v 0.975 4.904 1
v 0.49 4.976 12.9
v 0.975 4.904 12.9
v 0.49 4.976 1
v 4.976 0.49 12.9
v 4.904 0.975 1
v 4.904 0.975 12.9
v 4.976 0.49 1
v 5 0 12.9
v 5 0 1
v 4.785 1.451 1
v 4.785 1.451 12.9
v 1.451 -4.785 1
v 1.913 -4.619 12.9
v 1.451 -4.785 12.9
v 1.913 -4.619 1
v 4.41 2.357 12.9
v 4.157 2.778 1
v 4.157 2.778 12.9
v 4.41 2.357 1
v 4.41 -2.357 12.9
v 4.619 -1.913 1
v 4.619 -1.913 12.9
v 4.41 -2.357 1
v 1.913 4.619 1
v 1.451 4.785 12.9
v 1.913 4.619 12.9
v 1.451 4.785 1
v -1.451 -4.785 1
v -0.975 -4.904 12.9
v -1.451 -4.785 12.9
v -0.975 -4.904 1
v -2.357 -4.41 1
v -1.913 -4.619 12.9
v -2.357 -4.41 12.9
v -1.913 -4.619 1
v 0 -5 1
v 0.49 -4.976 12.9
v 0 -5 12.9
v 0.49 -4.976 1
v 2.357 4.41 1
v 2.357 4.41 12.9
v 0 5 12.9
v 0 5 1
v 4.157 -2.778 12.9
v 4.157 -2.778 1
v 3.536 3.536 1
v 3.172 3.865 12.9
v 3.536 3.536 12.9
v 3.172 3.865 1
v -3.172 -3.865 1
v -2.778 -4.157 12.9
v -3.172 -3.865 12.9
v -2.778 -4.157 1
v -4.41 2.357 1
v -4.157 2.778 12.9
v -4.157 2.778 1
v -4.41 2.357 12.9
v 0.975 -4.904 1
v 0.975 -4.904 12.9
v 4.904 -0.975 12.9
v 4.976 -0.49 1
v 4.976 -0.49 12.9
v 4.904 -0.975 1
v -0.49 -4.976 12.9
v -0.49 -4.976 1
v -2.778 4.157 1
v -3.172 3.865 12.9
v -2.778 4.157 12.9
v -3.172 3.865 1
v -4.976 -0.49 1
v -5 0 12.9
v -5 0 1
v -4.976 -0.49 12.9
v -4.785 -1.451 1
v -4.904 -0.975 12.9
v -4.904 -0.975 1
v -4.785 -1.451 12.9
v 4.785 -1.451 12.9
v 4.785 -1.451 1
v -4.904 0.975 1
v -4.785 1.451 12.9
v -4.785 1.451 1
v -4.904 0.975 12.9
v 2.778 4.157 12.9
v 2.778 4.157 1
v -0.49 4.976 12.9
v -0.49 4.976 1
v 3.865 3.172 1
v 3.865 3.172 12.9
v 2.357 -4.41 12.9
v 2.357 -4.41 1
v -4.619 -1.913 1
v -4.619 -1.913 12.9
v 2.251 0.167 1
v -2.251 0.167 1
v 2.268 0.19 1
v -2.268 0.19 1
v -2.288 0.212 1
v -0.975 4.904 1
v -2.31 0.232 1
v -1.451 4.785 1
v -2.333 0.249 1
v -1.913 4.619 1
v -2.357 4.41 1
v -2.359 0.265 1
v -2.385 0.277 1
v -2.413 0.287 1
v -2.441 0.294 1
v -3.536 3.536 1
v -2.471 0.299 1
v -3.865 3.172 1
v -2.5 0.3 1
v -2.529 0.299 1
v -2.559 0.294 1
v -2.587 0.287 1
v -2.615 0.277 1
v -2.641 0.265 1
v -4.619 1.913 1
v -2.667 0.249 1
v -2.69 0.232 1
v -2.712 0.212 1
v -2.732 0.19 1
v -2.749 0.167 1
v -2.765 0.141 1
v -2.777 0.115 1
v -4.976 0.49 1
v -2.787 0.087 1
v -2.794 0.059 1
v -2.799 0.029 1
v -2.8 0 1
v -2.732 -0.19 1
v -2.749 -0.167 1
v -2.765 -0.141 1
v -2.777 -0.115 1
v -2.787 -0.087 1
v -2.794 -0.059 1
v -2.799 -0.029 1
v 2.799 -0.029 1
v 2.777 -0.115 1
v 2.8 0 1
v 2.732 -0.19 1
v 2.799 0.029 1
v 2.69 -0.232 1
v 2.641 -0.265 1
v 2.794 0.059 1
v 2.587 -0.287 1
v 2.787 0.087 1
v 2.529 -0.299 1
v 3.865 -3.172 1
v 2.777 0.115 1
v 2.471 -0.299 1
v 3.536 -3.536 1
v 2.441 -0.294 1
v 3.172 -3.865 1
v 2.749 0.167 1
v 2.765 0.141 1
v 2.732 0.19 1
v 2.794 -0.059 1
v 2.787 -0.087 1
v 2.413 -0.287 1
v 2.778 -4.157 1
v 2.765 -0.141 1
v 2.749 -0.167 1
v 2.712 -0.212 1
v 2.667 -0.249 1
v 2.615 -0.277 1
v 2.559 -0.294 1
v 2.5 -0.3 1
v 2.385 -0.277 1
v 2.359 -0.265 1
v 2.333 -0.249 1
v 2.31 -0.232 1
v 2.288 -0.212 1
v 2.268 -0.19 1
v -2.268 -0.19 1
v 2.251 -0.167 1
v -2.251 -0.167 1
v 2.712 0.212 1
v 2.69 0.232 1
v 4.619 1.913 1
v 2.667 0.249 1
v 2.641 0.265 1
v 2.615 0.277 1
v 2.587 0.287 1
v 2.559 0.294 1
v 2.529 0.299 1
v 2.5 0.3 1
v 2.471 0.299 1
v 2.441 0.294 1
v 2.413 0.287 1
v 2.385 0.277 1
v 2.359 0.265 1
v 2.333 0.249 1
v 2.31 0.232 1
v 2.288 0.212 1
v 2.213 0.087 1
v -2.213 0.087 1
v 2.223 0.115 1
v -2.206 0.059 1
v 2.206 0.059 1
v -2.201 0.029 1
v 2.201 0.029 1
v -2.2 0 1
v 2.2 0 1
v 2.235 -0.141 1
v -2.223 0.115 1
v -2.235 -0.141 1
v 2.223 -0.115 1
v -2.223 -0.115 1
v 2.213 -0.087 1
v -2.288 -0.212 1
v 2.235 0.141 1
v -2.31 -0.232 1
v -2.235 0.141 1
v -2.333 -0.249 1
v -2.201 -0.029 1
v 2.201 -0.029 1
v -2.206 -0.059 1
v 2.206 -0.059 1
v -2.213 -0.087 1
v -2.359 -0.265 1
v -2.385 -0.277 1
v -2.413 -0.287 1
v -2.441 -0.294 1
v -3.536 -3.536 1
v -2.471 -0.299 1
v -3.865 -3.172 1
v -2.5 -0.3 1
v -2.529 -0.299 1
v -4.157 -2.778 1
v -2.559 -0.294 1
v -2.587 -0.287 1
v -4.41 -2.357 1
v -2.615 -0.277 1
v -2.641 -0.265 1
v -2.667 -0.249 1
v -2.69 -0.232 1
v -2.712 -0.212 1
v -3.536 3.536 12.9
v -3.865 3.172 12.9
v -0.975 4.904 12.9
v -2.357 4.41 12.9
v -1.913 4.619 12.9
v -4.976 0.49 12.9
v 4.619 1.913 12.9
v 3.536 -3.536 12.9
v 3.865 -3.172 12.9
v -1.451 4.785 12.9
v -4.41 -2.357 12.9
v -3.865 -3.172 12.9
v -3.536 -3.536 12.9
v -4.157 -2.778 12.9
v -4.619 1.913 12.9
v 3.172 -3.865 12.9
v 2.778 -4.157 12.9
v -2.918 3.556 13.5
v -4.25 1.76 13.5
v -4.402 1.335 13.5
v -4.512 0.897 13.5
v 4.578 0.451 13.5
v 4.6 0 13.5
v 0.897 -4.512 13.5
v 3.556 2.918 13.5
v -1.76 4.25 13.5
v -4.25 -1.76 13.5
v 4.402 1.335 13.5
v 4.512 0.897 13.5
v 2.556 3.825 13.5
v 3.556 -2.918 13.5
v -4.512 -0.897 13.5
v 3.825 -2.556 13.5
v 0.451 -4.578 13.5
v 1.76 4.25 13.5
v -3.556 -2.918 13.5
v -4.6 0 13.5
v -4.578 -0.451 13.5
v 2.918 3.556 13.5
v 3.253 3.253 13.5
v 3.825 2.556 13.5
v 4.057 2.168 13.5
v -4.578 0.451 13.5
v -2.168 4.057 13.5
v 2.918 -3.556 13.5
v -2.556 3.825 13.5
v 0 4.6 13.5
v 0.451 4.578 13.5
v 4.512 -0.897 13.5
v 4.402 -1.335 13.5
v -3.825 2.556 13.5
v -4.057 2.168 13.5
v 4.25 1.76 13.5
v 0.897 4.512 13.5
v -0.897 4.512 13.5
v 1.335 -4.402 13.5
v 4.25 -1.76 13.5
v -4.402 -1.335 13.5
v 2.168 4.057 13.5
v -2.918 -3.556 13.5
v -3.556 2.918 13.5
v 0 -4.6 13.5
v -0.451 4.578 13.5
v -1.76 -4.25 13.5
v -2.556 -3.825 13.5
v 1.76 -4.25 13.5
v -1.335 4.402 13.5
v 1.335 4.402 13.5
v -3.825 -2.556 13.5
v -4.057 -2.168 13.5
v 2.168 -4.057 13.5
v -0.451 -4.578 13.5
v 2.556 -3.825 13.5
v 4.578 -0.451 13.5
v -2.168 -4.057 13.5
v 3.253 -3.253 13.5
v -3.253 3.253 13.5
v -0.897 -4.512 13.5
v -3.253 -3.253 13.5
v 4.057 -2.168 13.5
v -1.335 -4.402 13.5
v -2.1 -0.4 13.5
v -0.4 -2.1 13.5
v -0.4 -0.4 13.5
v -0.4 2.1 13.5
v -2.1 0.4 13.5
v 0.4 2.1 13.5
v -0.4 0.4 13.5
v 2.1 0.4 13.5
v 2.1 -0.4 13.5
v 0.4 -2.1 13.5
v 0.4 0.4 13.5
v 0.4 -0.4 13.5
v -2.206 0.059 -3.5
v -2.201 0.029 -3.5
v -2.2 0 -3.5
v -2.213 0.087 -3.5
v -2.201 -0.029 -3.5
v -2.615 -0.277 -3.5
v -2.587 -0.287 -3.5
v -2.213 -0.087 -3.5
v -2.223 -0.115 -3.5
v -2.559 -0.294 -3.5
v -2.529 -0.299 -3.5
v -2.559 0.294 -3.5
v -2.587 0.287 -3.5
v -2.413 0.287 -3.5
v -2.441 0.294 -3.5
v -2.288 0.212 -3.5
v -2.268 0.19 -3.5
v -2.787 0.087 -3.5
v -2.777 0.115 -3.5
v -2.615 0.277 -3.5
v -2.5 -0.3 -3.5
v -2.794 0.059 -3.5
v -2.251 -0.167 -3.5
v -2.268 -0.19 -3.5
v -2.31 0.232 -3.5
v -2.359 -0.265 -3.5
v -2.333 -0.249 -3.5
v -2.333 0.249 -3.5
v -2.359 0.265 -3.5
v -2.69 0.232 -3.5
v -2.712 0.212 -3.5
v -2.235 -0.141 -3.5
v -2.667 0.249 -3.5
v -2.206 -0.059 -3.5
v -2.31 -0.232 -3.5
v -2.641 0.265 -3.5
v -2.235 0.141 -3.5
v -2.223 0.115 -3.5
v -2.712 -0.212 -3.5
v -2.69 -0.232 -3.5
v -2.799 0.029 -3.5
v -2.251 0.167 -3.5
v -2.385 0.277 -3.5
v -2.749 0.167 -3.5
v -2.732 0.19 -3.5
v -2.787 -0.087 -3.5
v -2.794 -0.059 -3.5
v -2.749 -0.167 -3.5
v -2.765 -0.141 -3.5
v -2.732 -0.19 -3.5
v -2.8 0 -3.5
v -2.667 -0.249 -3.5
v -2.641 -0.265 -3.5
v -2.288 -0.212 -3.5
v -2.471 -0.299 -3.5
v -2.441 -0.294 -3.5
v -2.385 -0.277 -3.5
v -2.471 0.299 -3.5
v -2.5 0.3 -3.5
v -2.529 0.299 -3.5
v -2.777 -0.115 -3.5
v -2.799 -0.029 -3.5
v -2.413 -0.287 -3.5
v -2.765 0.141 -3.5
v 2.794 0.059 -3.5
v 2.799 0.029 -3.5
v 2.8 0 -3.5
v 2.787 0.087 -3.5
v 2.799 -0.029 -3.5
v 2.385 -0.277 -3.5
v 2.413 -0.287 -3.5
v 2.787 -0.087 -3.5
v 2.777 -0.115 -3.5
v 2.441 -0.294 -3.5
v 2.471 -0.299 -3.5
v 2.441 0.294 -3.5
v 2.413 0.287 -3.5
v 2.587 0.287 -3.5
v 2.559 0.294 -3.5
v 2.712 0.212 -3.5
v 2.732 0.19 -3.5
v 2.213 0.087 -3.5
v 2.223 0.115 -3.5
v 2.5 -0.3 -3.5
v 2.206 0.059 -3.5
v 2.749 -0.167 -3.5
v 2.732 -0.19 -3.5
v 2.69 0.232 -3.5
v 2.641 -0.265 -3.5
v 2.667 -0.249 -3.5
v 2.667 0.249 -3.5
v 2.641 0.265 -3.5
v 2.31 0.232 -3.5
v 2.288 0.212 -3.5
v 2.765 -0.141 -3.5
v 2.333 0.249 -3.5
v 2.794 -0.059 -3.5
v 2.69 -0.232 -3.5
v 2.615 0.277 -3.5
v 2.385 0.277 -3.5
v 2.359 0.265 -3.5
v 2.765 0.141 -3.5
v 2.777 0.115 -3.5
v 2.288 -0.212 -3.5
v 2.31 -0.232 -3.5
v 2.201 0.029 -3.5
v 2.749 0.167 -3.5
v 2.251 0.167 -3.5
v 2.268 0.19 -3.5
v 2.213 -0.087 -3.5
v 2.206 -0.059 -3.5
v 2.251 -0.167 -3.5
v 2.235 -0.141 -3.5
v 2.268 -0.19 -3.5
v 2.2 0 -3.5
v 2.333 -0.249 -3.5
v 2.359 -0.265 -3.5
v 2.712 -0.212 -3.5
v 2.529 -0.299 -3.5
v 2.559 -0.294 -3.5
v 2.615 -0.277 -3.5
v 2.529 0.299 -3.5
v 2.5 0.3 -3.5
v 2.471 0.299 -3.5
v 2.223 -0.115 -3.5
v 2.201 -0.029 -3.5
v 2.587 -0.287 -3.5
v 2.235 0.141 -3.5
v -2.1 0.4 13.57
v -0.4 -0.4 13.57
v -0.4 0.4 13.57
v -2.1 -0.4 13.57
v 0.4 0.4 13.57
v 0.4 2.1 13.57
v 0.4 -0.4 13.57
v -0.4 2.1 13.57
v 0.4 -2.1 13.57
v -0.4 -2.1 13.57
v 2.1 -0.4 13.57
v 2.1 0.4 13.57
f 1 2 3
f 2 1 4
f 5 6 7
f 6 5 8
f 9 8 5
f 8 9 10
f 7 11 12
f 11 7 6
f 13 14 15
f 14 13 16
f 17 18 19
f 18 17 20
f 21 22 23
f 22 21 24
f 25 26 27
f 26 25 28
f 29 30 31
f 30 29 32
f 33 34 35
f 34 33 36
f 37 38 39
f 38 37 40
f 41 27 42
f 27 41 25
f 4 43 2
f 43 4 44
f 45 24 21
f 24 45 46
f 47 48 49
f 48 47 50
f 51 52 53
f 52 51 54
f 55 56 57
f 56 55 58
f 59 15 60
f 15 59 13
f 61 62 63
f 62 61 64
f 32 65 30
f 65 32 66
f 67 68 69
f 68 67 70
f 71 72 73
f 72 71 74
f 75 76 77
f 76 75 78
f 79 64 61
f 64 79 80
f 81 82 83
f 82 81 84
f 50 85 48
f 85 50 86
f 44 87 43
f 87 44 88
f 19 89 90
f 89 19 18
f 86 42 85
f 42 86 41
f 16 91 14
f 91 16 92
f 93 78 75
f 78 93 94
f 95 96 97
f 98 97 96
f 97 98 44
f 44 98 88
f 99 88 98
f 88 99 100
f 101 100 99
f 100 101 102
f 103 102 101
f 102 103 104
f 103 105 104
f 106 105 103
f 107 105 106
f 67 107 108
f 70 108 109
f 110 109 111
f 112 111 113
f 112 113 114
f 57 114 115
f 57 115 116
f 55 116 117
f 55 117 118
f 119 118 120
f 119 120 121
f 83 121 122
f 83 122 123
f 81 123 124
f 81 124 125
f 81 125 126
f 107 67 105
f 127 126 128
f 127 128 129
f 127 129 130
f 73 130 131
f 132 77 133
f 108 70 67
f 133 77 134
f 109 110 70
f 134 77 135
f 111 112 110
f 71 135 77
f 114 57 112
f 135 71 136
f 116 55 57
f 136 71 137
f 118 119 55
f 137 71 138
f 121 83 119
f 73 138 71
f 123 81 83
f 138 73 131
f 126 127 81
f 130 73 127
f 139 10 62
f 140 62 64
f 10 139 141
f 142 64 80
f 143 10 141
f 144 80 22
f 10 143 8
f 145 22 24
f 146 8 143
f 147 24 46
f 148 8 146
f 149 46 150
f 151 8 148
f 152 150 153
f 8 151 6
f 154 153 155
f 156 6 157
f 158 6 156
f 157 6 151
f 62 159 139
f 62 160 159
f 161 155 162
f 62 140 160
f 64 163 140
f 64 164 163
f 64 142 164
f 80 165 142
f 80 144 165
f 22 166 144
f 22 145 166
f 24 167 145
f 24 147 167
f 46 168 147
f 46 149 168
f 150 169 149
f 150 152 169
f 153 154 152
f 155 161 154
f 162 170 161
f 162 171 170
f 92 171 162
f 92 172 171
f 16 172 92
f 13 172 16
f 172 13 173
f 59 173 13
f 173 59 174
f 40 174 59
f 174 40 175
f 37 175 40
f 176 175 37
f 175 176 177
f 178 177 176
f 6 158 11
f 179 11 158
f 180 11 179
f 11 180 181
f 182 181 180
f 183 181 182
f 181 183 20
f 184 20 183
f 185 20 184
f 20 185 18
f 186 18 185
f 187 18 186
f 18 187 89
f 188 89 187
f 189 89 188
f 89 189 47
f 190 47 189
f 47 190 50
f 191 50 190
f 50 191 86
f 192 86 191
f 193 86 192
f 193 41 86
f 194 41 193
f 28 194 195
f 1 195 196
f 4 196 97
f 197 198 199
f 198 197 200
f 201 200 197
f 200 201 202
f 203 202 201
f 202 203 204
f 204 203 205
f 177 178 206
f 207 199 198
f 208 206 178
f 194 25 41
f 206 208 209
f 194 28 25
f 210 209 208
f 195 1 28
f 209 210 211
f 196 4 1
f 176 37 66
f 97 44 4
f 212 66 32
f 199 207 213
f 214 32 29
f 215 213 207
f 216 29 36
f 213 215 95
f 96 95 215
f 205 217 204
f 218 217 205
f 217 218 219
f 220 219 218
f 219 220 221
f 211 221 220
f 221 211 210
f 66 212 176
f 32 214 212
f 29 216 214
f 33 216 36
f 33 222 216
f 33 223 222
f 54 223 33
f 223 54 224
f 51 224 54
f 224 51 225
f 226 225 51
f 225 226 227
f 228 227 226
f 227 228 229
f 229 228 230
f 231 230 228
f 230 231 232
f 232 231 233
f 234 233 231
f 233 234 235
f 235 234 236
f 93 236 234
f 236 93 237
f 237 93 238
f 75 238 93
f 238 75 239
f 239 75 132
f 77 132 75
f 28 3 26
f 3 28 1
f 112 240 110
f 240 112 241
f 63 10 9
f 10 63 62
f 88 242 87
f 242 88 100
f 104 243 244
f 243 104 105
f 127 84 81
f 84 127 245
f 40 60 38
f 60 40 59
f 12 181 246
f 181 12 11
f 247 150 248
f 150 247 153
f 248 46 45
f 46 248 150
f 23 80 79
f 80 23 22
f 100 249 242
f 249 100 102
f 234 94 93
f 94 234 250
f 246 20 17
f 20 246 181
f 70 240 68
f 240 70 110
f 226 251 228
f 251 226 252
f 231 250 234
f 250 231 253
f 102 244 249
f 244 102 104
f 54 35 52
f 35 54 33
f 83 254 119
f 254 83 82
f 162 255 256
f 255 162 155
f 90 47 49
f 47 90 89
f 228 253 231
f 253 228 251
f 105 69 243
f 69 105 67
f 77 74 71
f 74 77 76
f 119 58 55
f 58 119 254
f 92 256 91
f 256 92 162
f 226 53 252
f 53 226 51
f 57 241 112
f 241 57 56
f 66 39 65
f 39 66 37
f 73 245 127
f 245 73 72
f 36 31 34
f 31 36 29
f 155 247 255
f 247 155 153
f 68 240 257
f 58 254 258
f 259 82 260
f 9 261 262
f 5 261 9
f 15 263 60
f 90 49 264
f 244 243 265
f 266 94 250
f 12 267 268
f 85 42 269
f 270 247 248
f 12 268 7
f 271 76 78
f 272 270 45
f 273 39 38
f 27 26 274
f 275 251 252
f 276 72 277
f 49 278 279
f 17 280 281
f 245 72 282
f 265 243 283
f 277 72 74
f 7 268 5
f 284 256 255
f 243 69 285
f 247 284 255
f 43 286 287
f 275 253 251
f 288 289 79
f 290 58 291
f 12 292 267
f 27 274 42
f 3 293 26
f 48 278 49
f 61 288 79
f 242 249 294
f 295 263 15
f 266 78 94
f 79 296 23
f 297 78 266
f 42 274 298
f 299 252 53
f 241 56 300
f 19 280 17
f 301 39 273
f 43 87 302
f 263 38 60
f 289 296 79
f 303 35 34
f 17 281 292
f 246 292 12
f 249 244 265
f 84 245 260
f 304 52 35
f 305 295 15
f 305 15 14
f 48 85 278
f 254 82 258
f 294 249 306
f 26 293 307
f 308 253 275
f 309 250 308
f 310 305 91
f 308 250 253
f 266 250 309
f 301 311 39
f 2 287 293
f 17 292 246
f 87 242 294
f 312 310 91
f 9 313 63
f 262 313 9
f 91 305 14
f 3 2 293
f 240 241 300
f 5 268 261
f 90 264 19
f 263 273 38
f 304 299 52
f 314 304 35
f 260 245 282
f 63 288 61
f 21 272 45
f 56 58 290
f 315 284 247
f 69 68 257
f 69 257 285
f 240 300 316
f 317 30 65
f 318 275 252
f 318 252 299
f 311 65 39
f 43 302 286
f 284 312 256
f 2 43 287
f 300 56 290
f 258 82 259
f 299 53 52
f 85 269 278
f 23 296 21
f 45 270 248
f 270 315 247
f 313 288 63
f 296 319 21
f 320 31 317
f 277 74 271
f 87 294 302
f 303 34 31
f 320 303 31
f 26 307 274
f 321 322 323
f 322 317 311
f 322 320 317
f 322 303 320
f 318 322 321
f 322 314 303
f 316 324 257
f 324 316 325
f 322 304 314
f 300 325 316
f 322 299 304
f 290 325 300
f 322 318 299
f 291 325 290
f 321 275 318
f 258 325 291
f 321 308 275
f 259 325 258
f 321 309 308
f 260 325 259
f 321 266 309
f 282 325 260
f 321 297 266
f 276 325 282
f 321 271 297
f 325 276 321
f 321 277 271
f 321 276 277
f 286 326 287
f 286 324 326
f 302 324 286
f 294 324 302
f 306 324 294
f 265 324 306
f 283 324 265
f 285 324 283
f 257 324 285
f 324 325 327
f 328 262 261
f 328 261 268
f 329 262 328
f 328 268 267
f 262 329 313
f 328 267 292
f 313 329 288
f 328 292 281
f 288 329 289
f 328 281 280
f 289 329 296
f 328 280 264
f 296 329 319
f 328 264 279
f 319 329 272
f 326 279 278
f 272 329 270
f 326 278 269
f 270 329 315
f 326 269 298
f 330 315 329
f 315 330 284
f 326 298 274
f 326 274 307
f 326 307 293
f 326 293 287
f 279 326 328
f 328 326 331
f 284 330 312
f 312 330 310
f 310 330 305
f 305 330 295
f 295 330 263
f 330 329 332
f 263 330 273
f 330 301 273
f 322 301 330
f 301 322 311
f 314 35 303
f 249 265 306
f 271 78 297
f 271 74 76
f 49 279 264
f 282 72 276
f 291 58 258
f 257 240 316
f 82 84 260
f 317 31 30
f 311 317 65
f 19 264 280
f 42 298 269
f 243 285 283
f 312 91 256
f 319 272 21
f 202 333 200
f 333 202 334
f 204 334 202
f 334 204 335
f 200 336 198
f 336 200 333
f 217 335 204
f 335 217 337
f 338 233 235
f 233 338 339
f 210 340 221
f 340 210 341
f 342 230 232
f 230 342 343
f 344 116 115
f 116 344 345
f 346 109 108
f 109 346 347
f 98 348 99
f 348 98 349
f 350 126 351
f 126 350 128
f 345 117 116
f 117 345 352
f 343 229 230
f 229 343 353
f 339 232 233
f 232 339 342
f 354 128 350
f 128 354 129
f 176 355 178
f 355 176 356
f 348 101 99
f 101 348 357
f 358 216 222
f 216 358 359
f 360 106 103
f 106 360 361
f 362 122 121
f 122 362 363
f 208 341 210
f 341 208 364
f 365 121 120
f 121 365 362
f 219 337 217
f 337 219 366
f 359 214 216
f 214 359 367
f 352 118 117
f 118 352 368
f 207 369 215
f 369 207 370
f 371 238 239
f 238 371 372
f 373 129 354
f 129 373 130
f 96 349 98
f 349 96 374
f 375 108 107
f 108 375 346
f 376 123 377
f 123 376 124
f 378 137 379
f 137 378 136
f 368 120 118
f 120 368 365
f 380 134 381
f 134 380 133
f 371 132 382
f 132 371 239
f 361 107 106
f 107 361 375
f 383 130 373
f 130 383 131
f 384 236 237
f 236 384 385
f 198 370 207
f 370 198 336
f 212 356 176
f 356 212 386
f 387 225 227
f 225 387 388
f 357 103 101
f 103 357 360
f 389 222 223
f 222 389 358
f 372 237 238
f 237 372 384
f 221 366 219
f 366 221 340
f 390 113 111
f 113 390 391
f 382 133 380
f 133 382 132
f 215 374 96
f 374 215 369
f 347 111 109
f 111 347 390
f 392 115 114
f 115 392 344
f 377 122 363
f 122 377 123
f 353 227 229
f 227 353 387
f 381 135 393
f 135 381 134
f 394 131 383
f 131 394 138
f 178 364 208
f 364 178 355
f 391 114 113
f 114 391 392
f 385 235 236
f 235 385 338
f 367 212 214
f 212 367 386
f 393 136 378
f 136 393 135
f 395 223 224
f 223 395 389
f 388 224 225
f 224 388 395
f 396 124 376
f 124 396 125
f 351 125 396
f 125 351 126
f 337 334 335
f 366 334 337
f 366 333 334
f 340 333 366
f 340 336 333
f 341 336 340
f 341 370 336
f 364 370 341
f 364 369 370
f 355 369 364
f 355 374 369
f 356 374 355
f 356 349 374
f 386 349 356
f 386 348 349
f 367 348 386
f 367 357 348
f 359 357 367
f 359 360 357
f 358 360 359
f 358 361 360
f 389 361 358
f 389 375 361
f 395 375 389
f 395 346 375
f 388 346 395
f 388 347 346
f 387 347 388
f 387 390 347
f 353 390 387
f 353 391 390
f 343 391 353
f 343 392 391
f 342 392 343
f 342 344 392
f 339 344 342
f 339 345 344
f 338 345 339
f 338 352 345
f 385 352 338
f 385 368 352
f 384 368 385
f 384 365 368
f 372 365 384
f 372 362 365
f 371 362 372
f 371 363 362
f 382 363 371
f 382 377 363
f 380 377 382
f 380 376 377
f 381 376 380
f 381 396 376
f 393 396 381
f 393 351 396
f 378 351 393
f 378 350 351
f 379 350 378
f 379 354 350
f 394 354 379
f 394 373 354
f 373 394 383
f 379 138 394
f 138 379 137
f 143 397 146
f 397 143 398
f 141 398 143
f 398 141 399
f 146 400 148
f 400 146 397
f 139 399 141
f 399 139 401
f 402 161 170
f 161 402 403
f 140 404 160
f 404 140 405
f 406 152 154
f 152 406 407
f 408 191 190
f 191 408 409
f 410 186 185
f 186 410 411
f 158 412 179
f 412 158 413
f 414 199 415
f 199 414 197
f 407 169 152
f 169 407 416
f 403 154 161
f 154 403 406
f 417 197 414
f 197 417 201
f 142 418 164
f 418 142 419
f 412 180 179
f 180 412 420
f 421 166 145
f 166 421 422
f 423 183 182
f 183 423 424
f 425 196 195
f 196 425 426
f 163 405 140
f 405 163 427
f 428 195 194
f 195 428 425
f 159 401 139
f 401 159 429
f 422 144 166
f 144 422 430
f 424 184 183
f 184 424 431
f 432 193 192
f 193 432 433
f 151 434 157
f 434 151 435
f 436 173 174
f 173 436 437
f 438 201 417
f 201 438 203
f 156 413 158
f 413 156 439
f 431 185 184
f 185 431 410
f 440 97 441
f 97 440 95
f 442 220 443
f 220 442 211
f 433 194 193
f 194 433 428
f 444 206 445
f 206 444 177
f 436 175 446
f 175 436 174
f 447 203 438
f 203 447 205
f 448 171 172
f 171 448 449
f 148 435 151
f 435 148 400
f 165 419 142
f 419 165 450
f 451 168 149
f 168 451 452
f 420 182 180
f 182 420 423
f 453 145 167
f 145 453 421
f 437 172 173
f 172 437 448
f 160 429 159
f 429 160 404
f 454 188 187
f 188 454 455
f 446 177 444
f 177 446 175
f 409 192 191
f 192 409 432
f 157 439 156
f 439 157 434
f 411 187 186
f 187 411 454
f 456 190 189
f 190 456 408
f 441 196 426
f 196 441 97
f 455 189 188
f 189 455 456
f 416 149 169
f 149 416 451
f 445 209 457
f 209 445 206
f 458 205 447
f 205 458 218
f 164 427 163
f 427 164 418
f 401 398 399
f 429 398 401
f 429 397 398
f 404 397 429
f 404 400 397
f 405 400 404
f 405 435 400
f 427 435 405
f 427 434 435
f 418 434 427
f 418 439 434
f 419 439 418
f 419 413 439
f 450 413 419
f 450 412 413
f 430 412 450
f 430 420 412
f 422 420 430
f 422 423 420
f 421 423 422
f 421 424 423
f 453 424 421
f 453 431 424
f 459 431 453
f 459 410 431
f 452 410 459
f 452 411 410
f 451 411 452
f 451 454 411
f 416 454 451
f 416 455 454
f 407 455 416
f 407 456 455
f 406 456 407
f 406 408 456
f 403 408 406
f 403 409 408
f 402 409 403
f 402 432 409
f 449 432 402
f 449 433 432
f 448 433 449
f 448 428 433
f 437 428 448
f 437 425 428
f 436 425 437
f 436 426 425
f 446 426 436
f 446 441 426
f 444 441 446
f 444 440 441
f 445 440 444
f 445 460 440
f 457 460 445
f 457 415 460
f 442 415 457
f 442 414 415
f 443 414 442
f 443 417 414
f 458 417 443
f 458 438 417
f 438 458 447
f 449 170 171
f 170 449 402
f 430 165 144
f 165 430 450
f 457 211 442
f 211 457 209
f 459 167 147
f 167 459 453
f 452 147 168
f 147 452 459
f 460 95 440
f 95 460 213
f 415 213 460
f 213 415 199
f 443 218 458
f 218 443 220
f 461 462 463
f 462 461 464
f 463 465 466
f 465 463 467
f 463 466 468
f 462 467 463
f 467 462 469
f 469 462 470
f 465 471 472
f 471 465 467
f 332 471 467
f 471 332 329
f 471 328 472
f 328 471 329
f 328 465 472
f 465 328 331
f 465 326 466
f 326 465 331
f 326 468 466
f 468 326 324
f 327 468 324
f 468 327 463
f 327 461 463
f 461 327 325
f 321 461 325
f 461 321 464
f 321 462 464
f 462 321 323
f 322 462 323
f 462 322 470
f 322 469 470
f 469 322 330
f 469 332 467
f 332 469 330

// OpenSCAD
$fn = 64;

body_diameter = 10;
body_height = 12.5;
lead_spacing = 5;
lead_diameter = 0.6;
lead_length_below = 3.5;
body_lift = 1;
lead_stub = 1;
top_chamfer = 0.6;

module lead(x) {
    color([0.75, 0.75, 0.75])
    translate([x, 0, -lead_length_below])
        cylinder(h = lead_length_below + body_lift + lead_stub, d = lead_diameter);
}

module capacitor_body() {
    color([0.16, 0.18, 0.19])
    union() {
        translate([0, 0, body_lift])
            cylinder(h = body_height - top_chamfer, d = body_diameter);
        translate([0, 0, body_lift + body_height - top_chamfer])
            cylinder(h = top_chamfer, d1 = body_diameter, d2 = body_diameter * 0.92);
    }
}

module top_vent() {
    color([0.78, 0.78, 0.78])
    translate([0, 0, body_lift + body_height - 0.05])
    linear_extrude(height = 0.12)
    union() {
        square([body_diameter * 0.42, body_diameter * 0.08], center = true);
        square([body_diameter * 0.08, body_diameter * 0.42], center = true);
    }
}

lead(-lead_spacing / 2);
lead( lead_spacing / 2);
capacitor_body();
top_vent();
